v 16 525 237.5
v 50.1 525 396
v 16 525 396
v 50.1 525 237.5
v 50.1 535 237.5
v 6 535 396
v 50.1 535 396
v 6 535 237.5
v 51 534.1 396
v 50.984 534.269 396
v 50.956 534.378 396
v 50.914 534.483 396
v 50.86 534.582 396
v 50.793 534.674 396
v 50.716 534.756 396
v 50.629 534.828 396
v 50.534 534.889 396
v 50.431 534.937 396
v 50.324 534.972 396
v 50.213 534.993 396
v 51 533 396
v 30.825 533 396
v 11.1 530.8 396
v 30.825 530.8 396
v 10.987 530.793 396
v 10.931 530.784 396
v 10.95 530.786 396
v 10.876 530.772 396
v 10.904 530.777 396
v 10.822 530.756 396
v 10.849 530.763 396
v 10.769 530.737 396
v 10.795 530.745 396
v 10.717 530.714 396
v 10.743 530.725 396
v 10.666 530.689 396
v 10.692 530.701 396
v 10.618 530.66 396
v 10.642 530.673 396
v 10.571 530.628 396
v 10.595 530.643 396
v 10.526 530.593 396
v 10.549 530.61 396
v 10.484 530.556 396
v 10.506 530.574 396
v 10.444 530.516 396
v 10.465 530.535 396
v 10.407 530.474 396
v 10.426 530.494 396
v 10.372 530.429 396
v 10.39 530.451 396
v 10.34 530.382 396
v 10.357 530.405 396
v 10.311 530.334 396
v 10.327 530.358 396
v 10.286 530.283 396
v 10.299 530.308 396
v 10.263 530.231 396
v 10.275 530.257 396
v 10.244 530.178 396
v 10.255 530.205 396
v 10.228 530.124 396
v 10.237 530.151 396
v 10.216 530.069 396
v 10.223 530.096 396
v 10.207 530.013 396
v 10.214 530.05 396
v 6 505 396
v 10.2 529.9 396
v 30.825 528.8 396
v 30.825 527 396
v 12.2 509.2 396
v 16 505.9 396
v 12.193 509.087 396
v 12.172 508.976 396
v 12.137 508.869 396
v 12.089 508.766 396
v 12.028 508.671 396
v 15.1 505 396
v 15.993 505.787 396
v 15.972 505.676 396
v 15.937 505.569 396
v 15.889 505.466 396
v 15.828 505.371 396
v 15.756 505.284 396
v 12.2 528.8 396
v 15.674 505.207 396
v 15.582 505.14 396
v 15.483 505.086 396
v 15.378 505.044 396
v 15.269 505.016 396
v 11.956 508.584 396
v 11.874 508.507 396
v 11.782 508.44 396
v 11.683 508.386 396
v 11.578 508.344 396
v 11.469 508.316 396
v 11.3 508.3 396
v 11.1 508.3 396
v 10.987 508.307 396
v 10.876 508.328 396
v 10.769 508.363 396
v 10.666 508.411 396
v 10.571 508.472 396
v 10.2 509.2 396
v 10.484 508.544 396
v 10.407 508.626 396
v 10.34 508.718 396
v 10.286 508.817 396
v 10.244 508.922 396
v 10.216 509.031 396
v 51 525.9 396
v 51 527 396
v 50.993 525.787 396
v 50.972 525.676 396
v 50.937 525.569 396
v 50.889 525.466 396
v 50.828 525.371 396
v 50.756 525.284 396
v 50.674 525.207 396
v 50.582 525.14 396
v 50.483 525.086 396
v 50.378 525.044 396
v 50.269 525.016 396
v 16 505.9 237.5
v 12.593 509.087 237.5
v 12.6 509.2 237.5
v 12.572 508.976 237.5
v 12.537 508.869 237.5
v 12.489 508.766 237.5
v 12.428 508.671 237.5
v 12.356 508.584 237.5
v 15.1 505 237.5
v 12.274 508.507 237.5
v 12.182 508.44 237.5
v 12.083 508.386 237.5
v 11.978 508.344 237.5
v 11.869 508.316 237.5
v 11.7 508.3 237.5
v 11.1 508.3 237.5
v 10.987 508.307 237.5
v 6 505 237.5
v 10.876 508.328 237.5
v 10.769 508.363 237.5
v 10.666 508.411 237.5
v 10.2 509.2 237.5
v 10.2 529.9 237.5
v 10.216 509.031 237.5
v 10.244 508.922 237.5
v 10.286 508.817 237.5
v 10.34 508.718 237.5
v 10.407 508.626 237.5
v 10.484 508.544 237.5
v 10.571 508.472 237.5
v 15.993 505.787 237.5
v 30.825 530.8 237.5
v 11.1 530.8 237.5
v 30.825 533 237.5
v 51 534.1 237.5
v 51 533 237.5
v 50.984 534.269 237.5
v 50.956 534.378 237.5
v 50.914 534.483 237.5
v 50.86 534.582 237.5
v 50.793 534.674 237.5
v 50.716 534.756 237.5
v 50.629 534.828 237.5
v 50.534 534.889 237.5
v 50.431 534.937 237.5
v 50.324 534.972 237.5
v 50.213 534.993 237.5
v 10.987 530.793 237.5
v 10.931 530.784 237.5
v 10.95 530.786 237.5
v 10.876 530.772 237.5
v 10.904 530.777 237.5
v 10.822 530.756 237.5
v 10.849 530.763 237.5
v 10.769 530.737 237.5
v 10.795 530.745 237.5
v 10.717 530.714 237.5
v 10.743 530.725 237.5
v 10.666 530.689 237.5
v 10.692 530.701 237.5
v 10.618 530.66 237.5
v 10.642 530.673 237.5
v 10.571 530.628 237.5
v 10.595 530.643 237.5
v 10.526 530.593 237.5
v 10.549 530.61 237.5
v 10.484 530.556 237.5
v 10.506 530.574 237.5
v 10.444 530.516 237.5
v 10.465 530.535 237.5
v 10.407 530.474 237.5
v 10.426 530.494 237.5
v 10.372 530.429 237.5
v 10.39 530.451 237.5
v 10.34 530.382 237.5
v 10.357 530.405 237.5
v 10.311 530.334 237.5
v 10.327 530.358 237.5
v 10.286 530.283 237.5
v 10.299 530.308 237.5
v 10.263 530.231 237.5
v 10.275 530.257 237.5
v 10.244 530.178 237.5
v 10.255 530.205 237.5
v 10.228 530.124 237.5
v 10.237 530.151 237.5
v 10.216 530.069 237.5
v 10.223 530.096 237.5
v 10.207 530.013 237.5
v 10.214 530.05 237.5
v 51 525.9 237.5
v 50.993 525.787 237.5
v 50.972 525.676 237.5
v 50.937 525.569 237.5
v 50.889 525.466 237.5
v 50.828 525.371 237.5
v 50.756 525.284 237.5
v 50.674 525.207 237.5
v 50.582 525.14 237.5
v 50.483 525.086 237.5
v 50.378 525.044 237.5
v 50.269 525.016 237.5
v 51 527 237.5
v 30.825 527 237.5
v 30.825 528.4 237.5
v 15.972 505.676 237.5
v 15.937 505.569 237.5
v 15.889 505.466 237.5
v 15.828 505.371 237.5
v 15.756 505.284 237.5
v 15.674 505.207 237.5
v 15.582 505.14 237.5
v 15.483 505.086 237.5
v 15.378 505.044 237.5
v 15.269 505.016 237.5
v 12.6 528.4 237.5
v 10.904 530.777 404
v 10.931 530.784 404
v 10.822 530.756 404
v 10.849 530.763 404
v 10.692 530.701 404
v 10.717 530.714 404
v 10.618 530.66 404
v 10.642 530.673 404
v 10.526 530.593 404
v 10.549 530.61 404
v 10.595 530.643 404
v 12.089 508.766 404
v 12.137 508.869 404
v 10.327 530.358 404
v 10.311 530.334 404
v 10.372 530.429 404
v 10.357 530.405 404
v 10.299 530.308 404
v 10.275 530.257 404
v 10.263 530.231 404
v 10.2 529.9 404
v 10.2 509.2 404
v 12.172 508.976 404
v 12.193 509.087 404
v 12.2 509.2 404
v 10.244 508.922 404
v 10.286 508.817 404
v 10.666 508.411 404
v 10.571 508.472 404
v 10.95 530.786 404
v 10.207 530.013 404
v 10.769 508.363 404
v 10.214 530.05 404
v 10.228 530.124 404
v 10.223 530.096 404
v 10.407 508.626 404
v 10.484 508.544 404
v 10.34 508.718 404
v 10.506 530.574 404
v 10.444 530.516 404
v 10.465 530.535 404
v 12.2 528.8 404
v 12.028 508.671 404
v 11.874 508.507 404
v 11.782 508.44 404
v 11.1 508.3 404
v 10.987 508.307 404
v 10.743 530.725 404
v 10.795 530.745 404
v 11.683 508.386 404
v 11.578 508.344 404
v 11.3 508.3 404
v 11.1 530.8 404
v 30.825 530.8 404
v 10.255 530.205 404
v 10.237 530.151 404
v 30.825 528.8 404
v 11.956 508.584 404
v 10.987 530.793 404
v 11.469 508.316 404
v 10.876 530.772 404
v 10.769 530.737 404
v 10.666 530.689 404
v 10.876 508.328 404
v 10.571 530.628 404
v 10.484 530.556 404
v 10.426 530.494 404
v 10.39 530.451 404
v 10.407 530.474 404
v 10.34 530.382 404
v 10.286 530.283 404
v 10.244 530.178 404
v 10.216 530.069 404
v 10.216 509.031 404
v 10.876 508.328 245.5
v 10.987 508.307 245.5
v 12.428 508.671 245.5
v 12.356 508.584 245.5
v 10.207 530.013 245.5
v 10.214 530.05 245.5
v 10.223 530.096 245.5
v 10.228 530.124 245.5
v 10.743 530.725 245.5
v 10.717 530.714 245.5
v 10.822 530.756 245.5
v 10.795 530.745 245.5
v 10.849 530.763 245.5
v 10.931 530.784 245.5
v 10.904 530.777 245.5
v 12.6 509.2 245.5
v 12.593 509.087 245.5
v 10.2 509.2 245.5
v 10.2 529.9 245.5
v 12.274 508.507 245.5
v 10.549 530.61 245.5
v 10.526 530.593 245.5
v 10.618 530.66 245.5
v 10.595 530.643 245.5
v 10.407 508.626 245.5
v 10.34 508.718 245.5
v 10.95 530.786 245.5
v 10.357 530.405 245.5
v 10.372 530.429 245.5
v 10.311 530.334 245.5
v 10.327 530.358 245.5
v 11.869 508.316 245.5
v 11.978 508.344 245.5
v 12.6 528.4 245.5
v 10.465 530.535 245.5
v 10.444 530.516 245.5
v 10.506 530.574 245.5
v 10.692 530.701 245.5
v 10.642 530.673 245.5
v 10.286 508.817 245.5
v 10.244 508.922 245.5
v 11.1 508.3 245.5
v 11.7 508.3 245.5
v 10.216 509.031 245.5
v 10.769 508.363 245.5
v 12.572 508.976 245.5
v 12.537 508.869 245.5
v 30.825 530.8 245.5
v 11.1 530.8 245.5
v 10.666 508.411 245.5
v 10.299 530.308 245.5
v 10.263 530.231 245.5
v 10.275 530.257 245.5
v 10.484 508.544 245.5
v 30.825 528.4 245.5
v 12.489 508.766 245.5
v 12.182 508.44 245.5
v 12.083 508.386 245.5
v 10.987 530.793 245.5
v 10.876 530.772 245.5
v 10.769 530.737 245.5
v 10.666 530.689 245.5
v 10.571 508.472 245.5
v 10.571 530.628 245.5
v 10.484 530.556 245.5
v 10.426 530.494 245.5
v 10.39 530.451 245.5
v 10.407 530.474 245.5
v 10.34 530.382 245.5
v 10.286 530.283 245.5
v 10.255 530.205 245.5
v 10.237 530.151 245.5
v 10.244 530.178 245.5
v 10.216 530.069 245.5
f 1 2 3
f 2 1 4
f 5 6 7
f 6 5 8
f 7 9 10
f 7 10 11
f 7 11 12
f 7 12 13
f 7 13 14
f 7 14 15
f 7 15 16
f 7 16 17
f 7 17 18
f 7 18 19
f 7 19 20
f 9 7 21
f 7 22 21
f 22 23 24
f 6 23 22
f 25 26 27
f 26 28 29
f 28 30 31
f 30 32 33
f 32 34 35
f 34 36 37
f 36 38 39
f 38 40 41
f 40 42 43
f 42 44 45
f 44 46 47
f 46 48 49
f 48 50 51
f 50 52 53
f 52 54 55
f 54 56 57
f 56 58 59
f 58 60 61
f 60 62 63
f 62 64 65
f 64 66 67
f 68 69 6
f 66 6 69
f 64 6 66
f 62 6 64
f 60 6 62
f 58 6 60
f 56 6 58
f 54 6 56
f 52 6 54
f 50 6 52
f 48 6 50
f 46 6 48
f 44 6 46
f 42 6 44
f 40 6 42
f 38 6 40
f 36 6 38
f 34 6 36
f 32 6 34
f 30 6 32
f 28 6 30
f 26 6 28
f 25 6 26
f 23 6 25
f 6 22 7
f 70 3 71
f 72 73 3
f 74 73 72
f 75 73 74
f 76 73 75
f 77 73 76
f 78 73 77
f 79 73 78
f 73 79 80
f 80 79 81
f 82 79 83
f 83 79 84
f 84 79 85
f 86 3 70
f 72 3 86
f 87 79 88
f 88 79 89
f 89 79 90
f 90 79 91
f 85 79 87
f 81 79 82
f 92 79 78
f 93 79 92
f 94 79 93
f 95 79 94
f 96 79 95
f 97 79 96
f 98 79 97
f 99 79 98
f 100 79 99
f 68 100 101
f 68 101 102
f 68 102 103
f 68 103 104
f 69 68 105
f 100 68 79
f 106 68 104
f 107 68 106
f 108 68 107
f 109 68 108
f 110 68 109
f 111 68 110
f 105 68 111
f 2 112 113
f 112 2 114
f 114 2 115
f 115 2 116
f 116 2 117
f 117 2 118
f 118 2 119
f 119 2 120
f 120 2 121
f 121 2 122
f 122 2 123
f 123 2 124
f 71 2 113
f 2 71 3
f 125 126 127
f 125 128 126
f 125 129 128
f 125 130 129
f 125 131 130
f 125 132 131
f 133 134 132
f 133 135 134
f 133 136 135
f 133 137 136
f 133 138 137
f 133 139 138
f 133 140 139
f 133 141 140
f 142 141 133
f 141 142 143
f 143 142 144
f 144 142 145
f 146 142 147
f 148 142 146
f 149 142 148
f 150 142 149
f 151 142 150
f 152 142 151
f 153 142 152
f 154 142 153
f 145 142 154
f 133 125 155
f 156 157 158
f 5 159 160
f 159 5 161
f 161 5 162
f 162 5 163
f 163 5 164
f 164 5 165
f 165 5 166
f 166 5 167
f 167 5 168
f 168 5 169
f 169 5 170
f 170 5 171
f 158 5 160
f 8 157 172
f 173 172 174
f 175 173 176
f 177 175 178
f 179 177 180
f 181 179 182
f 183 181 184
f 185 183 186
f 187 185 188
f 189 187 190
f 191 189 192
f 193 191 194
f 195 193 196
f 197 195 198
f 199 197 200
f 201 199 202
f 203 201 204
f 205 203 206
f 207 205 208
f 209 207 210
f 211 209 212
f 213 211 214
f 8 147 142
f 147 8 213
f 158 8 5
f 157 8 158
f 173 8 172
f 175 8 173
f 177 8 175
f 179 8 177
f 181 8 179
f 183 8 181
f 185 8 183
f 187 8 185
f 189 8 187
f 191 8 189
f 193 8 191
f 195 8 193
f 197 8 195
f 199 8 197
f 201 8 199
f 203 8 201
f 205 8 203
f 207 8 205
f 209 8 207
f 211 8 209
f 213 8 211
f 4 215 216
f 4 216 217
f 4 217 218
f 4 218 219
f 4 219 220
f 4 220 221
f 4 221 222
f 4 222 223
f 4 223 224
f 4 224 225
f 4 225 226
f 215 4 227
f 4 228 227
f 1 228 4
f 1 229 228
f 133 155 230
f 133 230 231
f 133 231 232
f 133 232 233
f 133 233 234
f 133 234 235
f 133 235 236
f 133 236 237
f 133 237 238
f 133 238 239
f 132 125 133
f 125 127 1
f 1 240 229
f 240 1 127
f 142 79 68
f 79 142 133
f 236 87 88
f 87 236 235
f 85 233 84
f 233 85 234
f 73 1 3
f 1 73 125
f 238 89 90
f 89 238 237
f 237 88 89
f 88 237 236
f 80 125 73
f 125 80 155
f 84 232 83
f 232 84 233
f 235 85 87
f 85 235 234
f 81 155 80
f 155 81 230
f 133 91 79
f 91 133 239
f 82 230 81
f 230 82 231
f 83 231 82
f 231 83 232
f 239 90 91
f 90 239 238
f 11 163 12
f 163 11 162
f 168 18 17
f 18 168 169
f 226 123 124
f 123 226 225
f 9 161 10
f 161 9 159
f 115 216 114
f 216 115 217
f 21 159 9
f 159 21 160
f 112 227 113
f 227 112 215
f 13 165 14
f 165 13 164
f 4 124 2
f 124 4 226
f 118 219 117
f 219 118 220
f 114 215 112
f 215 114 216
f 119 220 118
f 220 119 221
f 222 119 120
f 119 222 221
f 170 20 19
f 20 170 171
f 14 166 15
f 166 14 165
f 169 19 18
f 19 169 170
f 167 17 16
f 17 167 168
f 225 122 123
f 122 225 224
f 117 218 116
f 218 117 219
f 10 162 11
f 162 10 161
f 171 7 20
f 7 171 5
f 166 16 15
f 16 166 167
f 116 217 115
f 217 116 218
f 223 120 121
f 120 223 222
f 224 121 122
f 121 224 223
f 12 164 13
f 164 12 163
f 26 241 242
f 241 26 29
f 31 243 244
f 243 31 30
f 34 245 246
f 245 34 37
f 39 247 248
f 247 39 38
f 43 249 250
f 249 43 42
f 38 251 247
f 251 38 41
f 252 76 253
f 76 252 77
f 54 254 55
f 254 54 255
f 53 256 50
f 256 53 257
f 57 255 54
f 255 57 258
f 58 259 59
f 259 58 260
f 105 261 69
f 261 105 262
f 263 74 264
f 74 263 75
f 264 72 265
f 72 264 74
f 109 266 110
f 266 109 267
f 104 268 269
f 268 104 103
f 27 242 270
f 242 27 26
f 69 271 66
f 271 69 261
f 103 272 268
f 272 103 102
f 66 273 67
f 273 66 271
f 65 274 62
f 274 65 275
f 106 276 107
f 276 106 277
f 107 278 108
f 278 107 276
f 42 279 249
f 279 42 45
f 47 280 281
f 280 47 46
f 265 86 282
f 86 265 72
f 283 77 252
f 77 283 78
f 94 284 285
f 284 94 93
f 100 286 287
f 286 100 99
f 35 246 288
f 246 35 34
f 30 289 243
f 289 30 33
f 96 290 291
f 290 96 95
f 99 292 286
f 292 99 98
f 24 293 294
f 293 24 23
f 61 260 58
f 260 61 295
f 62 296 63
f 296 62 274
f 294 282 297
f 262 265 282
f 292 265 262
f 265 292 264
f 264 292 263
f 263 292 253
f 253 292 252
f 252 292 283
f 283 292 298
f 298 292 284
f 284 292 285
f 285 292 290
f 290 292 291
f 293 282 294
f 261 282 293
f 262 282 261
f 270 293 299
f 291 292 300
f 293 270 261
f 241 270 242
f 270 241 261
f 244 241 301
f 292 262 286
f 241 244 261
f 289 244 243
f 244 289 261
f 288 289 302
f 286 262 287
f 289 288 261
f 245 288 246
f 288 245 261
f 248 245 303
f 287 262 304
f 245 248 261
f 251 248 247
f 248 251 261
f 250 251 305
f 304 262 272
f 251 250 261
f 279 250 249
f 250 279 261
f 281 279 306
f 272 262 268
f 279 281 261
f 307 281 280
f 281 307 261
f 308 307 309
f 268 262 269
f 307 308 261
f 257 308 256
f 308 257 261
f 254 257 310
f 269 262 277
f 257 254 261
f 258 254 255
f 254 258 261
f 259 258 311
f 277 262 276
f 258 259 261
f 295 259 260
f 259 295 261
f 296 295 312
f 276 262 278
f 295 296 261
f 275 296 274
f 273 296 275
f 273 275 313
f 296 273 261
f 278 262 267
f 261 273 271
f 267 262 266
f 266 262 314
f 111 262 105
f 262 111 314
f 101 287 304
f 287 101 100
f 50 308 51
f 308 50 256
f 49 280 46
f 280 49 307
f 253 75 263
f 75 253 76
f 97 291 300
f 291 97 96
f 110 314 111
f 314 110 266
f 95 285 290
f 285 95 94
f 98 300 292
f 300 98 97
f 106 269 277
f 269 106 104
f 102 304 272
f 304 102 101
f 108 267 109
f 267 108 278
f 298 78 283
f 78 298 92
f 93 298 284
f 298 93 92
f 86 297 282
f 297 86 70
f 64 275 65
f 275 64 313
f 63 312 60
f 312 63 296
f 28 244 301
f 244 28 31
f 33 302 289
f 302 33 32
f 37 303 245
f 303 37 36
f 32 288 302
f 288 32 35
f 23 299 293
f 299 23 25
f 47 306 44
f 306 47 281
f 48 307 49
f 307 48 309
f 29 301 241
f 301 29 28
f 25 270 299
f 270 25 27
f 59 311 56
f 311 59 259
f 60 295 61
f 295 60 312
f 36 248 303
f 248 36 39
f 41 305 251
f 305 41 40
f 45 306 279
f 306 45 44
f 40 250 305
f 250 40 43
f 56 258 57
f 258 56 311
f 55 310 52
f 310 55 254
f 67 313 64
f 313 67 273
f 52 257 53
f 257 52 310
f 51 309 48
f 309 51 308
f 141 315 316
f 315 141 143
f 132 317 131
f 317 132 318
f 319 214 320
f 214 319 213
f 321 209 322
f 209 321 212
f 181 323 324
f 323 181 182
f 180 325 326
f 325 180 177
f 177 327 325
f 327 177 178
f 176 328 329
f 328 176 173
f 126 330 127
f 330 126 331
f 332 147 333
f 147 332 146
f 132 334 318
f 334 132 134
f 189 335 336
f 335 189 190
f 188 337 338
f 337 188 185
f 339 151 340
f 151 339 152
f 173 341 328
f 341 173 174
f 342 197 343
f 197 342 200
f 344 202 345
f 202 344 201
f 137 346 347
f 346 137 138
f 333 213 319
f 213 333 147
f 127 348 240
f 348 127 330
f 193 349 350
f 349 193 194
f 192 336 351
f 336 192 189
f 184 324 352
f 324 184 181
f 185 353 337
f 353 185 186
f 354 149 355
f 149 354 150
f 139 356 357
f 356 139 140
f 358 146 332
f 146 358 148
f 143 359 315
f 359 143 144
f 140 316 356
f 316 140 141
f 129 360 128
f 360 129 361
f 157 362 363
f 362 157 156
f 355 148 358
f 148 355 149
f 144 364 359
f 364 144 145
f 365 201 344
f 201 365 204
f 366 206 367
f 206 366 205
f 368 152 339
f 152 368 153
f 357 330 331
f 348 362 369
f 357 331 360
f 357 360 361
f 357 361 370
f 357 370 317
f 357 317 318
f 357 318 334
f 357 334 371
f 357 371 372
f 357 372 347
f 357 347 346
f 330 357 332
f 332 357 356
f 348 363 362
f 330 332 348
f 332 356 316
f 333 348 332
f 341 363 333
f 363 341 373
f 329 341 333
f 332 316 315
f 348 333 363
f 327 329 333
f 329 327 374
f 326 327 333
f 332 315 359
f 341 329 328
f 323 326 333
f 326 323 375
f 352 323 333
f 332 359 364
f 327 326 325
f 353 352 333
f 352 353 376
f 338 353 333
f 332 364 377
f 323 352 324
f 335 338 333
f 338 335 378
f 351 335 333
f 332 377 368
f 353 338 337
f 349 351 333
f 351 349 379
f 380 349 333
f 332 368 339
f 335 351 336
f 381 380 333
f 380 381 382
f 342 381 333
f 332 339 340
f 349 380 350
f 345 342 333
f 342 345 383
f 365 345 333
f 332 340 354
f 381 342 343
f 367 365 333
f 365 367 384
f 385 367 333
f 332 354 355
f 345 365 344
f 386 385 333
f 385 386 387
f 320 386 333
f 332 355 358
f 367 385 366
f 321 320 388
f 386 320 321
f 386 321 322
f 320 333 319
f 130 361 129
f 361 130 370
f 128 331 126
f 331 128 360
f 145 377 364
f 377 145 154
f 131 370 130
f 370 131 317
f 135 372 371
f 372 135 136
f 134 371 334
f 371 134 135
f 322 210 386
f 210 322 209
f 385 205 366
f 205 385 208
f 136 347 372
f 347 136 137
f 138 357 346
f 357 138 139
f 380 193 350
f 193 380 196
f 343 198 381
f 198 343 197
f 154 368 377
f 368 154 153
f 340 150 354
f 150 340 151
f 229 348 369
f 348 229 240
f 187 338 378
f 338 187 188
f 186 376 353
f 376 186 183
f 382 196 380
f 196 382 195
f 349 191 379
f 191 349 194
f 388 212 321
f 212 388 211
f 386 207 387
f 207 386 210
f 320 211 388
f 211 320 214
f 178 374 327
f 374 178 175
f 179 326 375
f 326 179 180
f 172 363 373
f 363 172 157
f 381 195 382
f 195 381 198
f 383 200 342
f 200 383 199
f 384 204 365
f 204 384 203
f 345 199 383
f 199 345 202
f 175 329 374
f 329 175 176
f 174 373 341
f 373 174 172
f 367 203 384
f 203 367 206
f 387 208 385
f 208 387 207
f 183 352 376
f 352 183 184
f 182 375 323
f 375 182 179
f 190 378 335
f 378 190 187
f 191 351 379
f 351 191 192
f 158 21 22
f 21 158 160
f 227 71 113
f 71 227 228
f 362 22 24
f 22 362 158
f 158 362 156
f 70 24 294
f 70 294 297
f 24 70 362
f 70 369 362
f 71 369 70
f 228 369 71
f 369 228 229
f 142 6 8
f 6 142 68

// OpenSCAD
// file: construction.scad
/*
Specialized construction functions specifically for the enclosure.
By combining these operators the various instances of enclosure pieces 
can be constructed.
*/
include <parameters.scad>;
use <utility.scad>;

module lug() {
    ra = knob_diameter/2;
    rb = lug_diameter/2;
    rotate([0,90,90]) 
        rotate_extrude()
            color("DarkSeaGreen")
            polygon([[0,0],[0,lug_height],[rb,lug_height],
                [rb,2.5],[ra,1],[ra,0]]);
}

// extend the corner frame to be symmetrical with the front corner
module extend_frame_x(height=frame_corner_height) {
    union() {
        children();
        color("SteelBlue")
        translate([hinge_inner_diameter*2, hinge_inner_diameter,0]) 
            rotate([0,0,-90])
                frame( hinge_inner_diameter*3+1, 
                    height, hinge_inner_diameter, 
                    corner_roundness );
    }
}

module frame( width, height, thickness, roundness ) {
        linear_extrude(height=height)
            apply_roundness(roundness, $fs =0.01) 
                    square( [thickness, width] );
}

module frame_corner( width, height, thickness, roundness ) {    
    union() {
        mirror([0,1,0]) 
            rotate([0,0,-90])
                frame( width, height, thickness, roundness );
        frame( width, height, thickness + panel_thickness, roundness );
    }   
}

module frame_connector_corner(clearance=0) {
    translate([panel_thickness*1.7,panel_thickness*0.70, 0]) 
        cornerize()
            frame( frame_corner_width*0.75, frame_connector_depth, 
                frame_thickness*.20+clearance, corner_roundness );
        
}

module add_lugs() {   
    union() {
        children();
        translate([lug_offset_x,-lug_height,lug_offset_z]) 
            lug();
        translate([lug_offset_x,-lug_height, lug_offset_z+lug_offset_gap])
            lug(); 
    } 
}

module add_connector(height=frame_corner_height) {
    union() {
        children();

        color("SteelBlue")
        translate([0,0,height])
            frame_connector_corner();
    }
}

module add_hinge_post( top=false ) {
    union() {
        difference() {
            children();

            // create a negative space that snuggly fits the hinge
            translate([frame_corner_width+plastic_thickness+hinge_gap,
                hinge_inner_diameter/2, (top?frame_corner_height:0)])
                mirror(top?[0,0,1]:[0,0,0])
                    union() {
                         height = hinge_height-hinge_inner_diameter;
                        translate([0,0,height/2]) 
                            cube([hinge_inner_diameter+2,
                                hinge_inner_diameter+2,height+1.3],true);
                        // hinge open
                        rotate([0,0,-90]) translate([0,0,-0.1]) scale(1.05) hinge();
                        // hinge closed
                        rotate([0,0,0]) translate([0,0,-0.1]) scale(1.05) hinge();
                    }
            
        }
        color("SteelBlue")
        translate([frame_corner_width+plastic_thickness+hinge_gap,hinge_inner_diameter/2,0])
            cylinder(d=hinge_inner_diameter, frame_corner_height);
    }
}

module add_outside_frame( height ) {
    union() {
        children();
        translate([-plastic_thickness,-plastic_thickness,0])
            color("SteelBlue")
            frame( frame_corner_width+plastic_thickness, height, frame_thickness,
                corner_roundness);
        translate([14.5,0.05,height/2])
            color("SteelBlue")
            rotate([0,0,8])
            cube([frame_corner_width/2,plastic_thickness,height],true);
    }
}

module hinge() {
    height = hinge_height-hinge_inner_diameter;
    width = hinge_inner_diameter+hinge_ring_thickness;
    difference() {
        
        // create the base shape for the hinge
        union() {    
            cylinder(d=width, height);
            
            translate([hinge_inner_diameter*3+hinge_clearance,
                -hinge_offset,height/2-plastic_thickness/2]) 
                cube([hinge_length,hinge_thickness,
                    height+plastic_thickness],true);
           
            translate([2.52,-5.2,height/2]) 
                rotate([0,0,40]) 
                    cube([hinge_inner_diameter,
                        width+1,height],true);
        }
        
        // remove a hole for the hinge post to slide into
        cylinder(d=hinge_inner_diameter+tolerance_smooth, height+1);
        
        // trim the left corner
        translate([4,-17.5,height/2-1]) 
            rotate([0,0,145]) 
                cube([50,width-2,height+3],true);
        
        // smooth the tranistion to the bottom edge
        translate([32,-10,height/2-18.25]) 
            rotate([-88.5,0.1,96]) 
                cube([40,20,60],true);
        
        // add a chamfer to right corner
        translate([hinge_length+8,0,height+25]) 
            rotate([0,45,0]) 
            cube(50,true);
    }   
}

module add_connector_slot() {
    difference() {
        children();
        frame_connector_corner(tolerance_tight);
    }
}

module frame_vertical() {
    add_connector_slot()
    add_connector(frame_vertical_height)
    extend_frame_x(frame_vertical_height)
        frame_corner( frame_corner_width, 
            frame_vertical_height, frame_thickness, 
            corner_roundness );          
}

module grip() {
    rotate([90,90,90])
        color("DarkSeaGreen")
        frame(plastic_thickness,plastic_thickness,plastic_thickness,corner_roundness);
}

module add_snap_lock_slot(top=false) {
    difference() {
        children();
        translate([0,0,top?frame_corner_height+shelf_height:-shelf_height])
            mirror(top?[0,0,1]:[0,0,0])
                 snaplock(tolerance_tight,top);
    }
}

module lug2(clearance) {
    color("DarkSeaGreen")
    rotate([90,0,0])
            frame(frame_connector_depth+clearance,snaplock_connector_size/2,
                connector_thickness+clearance,corner_roundness);
}

module snaplock(clearance=0,top=false) {
    height = shelf_height+snaplock_connector_size+plastic_thickness+clearance;
    union() {
        color("Magenta")
        difference() {
            translate([snaplock_size,-snaplock_thickness*3,-plastic_thickness])
                rotate([0,0,90])
                    frame(snaplock_size+clearance,height,
                        snaplock_width*2+plastic_thickness, corner_roundness);
            fix_preview2() cube([snaplock_size*1.1,snaplock_width+plastic_thickness,shelf_height]);
        }

        // grips at top
        translate([5,1,shelf_height+1.5]) grip();
        translate([18,1,shelf_height+1.5]) grip();

        // grips at bottom
        translate([5,1,0.5]) grip();
        translate([18,1,0.5]) grip();

        // connector lugs
        translate([3*snaplock_size/4-connector_thickness/2-clearance/2,
            frame_connector_depth+snaplock_thickness,
            shelf_height+snaplock_connector_size/2 - (snaplock_connector_size/4)-clearance/2])
            lug2(clearance);

        translate([(top?2:1)*snaplock_size/4-connector_thickness/2-clearance/2,
            frame_connector_depth+snaplock_thickness,
            shelf_height+snaplock_connector_size/2 - (snaplock_connector_size/4)-clearance/2])
            lug2(clearance);
    }
}
// file: support.scad
/*
Provides support objects that are used to model the environment of the enclosure
to ensure the pieces slot together and fit properly.
*/
include <parameters.scad>;
use <utility.scad>;

module wall_panel() {
    cube([panel_height,panel_width,panel_thickness]);
}

module door_panel() {
     cube([door_panel_width,door_panel_height,door_panel_thickness]);
}

module left_wall_panel() {
    translate([panel_thickness,0,panel_offset_z]) 
        rotate([0,-90,0]) 
            wall_panel();
}

module back_wall_panel() {
    translate([(enclosure_width-panel_width)/2,
            enclosure_depth-panel_thickness-plastic_thickness,
            0]) 
        rotate([-90,-90,0]) 
            wall_panel();
}

module right_wall_panel() {
    translate([enclosure_width,0,panel_offset_z]) 
        rotate([0,-90,0]) 
            wall_panel();
}

module left_door(open=false) {
    translate([frame_corner_width+plastic_thickness+hinge_gap,
            hinge_inner_diameter/2,0]) 
        rotate([90,0,open?-90:0]) 
            translate([door_hinge_offset,0,hinge_offset-
                    door_panel_thickness/2])
                door_panel();
}

module right_door(open=false) {
    translate([enclosure_width,0,0])  
        mirror([1,0,0]) left_door(open);
}
// file: utility.scad
/*
Generically useful utility functions.
*/

// applies roundness without altering dimensions of object
module apply_roundness(r)
    offset(r) offset(delta=-r) children(0);

// makes a corner piece by mirroring and rotating one side
module cornerize() {
    union() {
        children(0);
        mirror([0,1,0]) 
            rotate([0,0,-90])
                children(0);
    }
} 

module explode(vector) {
    for(i=[0:$children-1])
        translate(vector*i)
            children(i);

}

/*
 The fix_preview series of functions are used to make small
 translations in order to reduce conincident plane artifacts
 from the preview mode. 

 It would be nice to have just one module for this but I haven't
 figured out a way of doing this generically - so the following
 uses a small translation in different directions depending on
 the use case needed.
*/
module fix_preview() {
    translate($preview?[-0.001,-0.001,-0.001]:[0,0,0])
        children(0);
}

module fix_preview2() {
    translate($preview?[-0.001,0.001,-0.001]:[0,0,0])
        children(0);
}

module fix_preview3() {
    translate($preview?[-0.001,0.001,0.001]:[0,0,0])
        children(0);
}
// file: parameters.scad
$fn=50;

// Wall thickness and tolerance
plastic_thickness=2.0;
tolerance_smooth=0.45;
tolerance_tight=0.40;
corner_roundness=0.9;

// Specify enclosure dimensions
enclosure_height=475.0;
enclosure_depth=535.0;

// Wall panel dimensions
panel_thickness=6.0;
panel_height=450.0;
panel_width=535.0;
panel_offset_z = enclosure_height - panel_height;

// Door panel dimensions
door_panel_thickness=3.0;
door_panel_width=250.0;
door_panel_height=475.0;
door_hinge_offset=6.5;

// Frame
frame_corner_width=30.0;
frame_corner_height=79.0;
frame_thickness = plastic_thickness*2 + panel_thickness;
frame_side = (enclosure_height - frame_corner_height*2)/2;
frame_clip_height=50.5;
frame_vertical_height = (enclosure_height-frame_corner_height*2)/2;
frame_connector_depth = 8.0;

// Lug
knob_diameter=9.8;
lug_diameter=6.2;
lug_gap=1.4;
lug_height = lug_gap+2.15;
lug_offset_x=15.0;
lug_offset_z=27.0;
lug_offset_gap=32;

// Snaplock
shelf_height=50.3+tolerance_tight;
snaplock_width=5+tolerance_tight;
snaplock_size=25;
snaplock_thickness=plastic_thickness;
snaplock_connector_size=15;
connector_thickness=frame_thickness*.4;

// Door hinge
hinge_inner_diameter=10;
hinge_height=25;
hinge_length=53;
hinge_gap = 9.6;
hinge_clearance = 1.5;
hinge_ring_thickness=3.0;
hinge_thickness=plastic_thickness*2 + door_panel_thickness;
hinge_offset=6.5+plastic_thickness;

enclosure_width=2*(frame_corner_width+plastic_thickness+hinge_gap
    +door_hinge_offset) + door_panel_width*2 +tolerance_smooth;
// main file
include <parameters.scad>
use <utility.scad>
use <support.scad>
use <construction.scad>

module back_left_vertical_b() {
    difference() {
        translate([0,enclosure_depth,frame_corner_height+frame_vertical_height])
            mirror([0,1,0])
                color("SteelBlue")
                frame_vertical();
        fix_preview() back_wall_panel();
        fix_preview() left_wall_panel();
    }
}

%fix_preview() back_wall_panel();
%fix_preview() left_wall_panel();
back_left_vertical_b();
